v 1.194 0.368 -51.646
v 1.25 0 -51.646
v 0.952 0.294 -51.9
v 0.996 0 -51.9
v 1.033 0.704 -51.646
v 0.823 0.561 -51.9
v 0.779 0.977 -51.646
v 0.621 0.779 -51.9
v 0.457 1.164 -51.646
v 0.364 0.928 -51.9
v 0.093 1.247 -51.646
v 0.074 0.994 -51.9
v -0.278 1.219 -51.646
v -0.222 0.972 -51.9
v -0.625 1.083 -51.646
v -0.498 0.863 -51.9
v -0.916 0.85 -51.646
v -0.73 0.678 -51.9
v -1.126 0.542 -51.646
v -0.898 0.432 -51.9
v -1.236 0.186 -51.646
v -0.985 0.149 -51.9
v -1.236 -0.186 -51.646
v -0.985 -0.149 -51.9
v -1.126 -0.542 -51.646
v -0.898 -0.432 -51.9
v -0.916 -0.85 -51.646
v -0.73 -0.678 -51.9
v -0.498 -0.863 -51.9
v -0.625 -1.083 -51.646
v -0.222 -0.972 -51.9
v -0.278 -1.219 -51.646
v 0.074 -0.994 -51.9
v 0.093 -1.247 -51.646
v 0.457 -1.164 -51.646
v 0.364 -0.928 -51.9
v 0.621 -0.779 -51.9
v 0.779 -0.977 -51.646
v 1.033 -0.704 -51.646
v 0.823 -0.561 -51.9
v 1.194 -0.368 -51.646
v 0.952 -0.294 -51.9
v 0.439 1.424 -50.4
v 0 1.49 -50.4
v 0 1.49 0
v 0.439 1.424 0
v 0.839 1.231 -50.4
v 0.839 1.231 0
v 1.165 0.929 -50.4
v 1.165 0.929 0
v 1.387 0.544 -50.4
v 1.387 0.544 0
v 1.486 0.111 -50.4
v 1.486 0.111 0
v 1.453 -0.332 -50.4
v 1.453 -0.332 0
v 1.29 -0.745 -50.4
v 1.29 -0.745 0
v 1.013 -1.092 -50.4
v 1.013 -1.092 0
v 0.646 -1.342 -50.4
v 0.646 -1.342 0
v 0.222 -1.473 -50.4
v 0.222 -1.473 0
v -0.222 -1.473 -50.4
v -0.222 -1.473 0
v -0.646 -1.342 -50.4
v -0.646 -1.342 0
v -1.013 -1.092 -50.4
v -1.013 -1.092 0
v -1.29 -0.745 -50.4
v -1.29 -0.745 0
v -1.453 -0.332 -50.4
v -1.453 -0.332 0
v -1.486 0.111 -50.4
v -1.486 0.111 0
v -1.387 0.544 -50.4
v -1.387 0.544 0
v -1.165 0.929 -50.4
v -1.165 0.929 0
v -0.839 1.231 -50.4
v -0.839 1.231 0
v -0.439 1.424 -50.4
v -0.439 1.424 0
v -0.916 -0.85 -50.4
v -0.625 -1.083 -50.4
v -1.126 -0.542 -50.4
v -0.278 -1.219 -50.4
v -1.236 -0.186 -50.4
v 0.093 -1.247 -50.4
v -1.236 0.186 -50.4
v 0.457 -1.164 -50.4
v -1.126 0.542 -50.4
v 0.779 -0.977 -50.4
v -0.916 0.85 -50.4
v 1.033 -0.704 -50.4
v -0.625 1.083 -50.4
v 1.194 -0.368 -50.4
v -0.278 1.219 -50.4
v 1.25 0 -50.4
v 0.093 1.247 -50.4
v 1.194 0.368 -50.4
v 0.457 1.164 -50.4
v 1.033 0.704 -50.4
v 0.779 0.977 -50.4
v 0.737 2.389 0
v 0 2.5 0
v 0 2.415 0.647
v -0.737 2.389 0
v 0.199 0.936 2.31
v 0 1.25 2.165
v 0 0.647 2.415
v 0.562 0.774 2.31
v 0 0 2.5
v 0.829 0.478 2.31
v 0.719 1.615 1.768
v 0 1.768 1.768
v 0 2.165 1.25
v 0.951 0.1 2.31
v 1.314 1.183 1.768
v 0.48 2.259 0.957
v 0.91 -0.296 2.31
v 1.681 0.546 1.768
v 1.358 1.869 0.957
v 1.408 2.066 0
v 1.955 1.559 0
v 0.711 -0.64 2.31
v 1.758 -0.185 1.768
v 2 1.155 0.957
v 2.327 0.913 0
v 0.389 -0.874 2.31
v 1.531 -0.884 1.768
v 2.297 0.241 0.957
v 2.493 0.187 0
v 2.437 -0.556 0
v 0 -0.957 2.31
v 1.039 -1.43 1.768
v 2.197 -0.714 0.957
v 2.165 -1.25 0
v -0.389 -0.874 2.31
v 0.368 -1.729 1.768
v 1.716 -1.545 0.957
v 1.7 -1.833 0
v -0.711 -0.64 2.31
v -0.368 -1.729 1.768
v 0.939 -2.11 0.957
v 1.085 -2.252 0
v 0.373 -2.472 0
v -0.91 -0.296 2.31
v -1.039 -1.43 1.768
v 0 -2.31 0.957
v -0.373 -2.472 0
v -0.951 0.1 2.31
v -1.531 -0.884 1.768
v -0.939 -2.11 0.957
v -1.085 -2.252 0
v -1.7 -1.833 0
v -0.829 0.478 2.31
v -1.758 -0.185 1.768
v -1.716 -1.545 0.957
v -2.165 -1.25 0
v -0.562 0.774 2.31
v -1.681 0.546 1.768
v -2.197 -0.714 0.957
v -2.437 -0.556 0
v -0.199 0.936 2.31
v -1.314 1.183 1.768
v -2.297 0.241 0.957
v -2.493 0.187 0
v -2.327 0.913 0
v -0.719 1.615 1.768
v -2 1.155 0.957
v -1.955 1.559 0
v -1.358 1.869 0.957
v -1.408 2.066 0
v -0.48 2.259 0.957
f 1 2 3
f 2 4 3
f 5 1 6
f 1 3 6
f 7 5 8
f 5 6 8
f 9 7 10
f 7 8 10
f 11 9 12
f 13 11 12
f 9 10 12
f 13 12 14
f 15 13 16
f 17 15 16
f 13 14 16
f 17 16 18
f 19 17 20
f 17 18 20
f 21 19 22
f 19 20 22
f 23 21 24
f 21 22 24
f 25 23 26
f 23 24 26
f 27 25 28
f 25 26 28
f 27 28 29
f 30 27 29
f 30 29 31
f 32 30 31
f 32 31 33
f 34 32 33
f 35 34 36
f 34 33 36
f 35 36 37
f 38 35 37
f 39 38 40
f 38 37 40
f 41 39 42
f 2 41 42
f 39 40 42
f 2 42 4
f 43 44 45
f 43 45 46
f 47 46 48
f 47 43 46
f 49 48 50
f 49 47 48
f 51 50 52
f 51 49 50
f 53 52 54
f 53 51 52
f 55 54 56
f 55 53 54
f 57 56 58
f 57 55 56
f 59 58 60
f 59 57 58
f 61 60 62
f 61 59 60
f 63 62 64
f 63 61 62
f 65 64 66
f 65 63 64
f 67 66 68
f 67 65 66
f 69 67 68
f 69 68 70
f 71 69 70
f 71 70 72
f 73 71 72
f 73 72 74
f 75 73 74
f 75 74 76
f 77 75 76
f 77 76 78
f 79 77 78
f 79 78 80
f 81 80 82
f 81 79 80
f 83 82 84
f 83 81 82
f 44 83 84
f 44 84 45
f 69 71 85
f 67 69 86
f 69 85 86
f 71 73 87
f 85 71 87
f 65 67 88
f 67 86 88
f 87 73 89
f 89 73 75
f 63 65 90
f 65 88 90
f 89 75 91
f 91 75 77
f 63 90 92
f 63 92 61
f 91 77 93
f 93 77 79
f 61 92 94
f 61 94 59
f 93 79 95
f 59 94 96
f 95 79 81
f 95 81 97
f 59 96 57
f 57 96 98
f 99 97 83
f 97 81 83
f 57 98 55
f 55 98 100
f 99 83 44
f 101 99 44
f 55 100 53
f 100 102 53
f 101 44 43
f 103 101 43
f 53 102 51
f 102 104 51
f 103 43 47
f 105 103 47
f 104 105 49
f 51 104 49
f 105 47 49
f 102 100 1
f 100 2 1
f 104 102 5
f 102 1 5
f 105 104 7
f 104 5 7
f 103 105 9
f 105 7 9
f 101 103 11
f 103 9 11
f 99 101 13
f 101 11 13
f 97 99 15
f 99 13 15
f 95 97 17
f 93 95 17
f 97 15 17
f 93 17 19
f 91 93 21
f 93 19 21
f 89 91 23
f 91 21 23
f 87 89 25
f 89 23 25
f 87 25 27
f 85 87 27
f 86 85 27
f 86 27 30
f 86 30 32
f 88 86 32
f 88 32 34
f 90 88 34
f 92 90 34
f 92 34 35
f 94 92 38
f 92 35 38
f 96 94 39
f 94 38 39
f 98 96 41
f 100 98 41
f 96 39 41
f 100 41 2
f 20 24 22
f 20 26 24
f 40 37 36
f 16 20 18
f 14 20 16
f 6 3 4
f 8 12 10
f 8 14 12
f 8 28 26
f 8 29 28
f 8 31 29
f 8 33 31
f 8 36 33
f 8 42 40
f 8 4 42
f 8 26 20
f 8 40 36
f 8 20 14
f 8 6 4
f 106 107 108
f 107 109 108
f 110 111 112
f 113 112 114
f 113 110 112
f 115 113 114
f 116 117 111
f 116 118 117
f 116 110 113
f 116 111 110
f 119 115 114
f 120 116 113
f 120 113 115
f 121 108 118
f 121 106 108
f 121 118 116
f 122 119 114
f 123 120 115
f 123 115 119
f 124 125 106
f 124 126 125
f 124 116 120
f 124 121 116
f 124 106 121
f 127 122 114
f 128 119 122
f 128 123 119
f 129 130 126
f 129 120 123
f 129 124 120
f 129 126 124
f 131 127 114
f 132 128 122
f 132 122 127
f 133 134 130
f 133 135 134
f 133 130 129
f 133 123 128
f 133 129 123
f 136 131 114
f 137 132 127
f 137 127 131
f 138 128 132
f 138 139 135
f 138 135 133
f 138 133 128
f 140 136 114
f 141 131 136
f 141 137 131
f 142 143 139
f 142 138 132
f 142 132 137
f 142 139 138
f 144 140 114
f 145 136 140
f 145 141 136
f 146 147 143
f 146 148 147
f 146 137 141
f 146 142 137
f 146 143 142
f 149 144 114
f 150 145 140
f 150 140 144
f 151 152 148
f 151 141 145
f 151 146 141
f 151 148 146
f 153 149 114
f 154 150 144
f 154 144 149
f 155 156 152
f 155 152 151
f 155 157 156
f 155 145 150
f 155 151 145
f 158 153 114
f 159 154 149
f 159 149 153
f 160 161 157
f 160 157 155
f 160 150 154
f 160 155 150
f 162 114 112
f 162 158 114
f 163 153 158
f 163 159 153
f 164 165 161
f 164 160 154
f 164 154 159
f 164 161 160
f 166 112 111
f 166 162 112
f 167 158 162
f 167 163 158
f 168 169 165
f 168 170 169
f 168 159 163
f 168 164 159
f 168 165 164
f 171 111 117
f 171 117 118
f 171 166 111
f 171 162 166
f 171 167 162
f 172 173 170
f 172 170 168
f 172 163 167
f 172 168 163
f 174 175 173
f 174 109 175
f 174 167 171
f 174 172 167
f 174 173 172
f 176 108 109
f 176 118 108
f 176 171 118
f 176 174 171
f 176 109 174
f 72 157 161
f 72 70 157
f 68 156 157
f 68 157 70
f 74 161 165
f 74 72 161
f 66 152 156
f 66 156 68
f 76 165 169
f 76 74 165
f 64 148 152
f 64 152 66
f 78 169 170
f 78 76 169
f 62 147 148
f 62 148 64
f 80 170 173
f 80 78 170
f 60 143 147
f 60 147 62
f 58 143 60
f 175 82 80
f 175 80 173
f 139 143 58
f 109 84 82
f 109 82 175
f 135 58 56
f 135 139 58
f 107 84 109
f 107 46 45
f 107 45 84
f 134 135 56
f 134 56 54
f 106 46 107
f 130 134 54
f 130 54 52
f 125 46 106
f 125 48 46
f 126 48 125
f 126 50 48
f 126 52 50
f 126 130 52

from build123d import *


# Read off the part's stored shape, not the designer's step: M2.5 Machine Threads Stud1
with BuildPart() as part:
    # Sketch1 → Revolve1 (revolve)
    with BuildSketch(Plane(origin=(0, 0, 0), x_dir=(0, 0, -1), z_dir=(1, 0, 0))):
        with BuildLine():
            Line((0, 1.49), (51.9, 1.49))
            Line((51.9, 1.49), (51.9, 0))
            Line((51.9, 0), (0, 0))
            Line((0, 0), (-2.5, 0))
            ThreePointArc((-2.5, 0), (-1.767766953, 1.767766953), (0, 2.5))
            Line((0, 2.5), (0, 1.49))
        make_face()
    revolve(axis=Axis((0, 0, 65.917114172), (0, 0, -1)))

    # M2.5 Machine Threads Stud1 outline → M2.5 Machine Threads Stud1 (revolve, cut)
    with BuildSketch(Plane.XZ):
        Polygon((0.9965, -51.9), (1.49, -51.9), (1.49, -50.4), (1.25, -50.4), (1.25, -51.6465), align=None)
    revolve(axis=Axis((0, 0, 0), (0, 0, 1)), mode=Mode.SUBTRACT)


solid = part.part
